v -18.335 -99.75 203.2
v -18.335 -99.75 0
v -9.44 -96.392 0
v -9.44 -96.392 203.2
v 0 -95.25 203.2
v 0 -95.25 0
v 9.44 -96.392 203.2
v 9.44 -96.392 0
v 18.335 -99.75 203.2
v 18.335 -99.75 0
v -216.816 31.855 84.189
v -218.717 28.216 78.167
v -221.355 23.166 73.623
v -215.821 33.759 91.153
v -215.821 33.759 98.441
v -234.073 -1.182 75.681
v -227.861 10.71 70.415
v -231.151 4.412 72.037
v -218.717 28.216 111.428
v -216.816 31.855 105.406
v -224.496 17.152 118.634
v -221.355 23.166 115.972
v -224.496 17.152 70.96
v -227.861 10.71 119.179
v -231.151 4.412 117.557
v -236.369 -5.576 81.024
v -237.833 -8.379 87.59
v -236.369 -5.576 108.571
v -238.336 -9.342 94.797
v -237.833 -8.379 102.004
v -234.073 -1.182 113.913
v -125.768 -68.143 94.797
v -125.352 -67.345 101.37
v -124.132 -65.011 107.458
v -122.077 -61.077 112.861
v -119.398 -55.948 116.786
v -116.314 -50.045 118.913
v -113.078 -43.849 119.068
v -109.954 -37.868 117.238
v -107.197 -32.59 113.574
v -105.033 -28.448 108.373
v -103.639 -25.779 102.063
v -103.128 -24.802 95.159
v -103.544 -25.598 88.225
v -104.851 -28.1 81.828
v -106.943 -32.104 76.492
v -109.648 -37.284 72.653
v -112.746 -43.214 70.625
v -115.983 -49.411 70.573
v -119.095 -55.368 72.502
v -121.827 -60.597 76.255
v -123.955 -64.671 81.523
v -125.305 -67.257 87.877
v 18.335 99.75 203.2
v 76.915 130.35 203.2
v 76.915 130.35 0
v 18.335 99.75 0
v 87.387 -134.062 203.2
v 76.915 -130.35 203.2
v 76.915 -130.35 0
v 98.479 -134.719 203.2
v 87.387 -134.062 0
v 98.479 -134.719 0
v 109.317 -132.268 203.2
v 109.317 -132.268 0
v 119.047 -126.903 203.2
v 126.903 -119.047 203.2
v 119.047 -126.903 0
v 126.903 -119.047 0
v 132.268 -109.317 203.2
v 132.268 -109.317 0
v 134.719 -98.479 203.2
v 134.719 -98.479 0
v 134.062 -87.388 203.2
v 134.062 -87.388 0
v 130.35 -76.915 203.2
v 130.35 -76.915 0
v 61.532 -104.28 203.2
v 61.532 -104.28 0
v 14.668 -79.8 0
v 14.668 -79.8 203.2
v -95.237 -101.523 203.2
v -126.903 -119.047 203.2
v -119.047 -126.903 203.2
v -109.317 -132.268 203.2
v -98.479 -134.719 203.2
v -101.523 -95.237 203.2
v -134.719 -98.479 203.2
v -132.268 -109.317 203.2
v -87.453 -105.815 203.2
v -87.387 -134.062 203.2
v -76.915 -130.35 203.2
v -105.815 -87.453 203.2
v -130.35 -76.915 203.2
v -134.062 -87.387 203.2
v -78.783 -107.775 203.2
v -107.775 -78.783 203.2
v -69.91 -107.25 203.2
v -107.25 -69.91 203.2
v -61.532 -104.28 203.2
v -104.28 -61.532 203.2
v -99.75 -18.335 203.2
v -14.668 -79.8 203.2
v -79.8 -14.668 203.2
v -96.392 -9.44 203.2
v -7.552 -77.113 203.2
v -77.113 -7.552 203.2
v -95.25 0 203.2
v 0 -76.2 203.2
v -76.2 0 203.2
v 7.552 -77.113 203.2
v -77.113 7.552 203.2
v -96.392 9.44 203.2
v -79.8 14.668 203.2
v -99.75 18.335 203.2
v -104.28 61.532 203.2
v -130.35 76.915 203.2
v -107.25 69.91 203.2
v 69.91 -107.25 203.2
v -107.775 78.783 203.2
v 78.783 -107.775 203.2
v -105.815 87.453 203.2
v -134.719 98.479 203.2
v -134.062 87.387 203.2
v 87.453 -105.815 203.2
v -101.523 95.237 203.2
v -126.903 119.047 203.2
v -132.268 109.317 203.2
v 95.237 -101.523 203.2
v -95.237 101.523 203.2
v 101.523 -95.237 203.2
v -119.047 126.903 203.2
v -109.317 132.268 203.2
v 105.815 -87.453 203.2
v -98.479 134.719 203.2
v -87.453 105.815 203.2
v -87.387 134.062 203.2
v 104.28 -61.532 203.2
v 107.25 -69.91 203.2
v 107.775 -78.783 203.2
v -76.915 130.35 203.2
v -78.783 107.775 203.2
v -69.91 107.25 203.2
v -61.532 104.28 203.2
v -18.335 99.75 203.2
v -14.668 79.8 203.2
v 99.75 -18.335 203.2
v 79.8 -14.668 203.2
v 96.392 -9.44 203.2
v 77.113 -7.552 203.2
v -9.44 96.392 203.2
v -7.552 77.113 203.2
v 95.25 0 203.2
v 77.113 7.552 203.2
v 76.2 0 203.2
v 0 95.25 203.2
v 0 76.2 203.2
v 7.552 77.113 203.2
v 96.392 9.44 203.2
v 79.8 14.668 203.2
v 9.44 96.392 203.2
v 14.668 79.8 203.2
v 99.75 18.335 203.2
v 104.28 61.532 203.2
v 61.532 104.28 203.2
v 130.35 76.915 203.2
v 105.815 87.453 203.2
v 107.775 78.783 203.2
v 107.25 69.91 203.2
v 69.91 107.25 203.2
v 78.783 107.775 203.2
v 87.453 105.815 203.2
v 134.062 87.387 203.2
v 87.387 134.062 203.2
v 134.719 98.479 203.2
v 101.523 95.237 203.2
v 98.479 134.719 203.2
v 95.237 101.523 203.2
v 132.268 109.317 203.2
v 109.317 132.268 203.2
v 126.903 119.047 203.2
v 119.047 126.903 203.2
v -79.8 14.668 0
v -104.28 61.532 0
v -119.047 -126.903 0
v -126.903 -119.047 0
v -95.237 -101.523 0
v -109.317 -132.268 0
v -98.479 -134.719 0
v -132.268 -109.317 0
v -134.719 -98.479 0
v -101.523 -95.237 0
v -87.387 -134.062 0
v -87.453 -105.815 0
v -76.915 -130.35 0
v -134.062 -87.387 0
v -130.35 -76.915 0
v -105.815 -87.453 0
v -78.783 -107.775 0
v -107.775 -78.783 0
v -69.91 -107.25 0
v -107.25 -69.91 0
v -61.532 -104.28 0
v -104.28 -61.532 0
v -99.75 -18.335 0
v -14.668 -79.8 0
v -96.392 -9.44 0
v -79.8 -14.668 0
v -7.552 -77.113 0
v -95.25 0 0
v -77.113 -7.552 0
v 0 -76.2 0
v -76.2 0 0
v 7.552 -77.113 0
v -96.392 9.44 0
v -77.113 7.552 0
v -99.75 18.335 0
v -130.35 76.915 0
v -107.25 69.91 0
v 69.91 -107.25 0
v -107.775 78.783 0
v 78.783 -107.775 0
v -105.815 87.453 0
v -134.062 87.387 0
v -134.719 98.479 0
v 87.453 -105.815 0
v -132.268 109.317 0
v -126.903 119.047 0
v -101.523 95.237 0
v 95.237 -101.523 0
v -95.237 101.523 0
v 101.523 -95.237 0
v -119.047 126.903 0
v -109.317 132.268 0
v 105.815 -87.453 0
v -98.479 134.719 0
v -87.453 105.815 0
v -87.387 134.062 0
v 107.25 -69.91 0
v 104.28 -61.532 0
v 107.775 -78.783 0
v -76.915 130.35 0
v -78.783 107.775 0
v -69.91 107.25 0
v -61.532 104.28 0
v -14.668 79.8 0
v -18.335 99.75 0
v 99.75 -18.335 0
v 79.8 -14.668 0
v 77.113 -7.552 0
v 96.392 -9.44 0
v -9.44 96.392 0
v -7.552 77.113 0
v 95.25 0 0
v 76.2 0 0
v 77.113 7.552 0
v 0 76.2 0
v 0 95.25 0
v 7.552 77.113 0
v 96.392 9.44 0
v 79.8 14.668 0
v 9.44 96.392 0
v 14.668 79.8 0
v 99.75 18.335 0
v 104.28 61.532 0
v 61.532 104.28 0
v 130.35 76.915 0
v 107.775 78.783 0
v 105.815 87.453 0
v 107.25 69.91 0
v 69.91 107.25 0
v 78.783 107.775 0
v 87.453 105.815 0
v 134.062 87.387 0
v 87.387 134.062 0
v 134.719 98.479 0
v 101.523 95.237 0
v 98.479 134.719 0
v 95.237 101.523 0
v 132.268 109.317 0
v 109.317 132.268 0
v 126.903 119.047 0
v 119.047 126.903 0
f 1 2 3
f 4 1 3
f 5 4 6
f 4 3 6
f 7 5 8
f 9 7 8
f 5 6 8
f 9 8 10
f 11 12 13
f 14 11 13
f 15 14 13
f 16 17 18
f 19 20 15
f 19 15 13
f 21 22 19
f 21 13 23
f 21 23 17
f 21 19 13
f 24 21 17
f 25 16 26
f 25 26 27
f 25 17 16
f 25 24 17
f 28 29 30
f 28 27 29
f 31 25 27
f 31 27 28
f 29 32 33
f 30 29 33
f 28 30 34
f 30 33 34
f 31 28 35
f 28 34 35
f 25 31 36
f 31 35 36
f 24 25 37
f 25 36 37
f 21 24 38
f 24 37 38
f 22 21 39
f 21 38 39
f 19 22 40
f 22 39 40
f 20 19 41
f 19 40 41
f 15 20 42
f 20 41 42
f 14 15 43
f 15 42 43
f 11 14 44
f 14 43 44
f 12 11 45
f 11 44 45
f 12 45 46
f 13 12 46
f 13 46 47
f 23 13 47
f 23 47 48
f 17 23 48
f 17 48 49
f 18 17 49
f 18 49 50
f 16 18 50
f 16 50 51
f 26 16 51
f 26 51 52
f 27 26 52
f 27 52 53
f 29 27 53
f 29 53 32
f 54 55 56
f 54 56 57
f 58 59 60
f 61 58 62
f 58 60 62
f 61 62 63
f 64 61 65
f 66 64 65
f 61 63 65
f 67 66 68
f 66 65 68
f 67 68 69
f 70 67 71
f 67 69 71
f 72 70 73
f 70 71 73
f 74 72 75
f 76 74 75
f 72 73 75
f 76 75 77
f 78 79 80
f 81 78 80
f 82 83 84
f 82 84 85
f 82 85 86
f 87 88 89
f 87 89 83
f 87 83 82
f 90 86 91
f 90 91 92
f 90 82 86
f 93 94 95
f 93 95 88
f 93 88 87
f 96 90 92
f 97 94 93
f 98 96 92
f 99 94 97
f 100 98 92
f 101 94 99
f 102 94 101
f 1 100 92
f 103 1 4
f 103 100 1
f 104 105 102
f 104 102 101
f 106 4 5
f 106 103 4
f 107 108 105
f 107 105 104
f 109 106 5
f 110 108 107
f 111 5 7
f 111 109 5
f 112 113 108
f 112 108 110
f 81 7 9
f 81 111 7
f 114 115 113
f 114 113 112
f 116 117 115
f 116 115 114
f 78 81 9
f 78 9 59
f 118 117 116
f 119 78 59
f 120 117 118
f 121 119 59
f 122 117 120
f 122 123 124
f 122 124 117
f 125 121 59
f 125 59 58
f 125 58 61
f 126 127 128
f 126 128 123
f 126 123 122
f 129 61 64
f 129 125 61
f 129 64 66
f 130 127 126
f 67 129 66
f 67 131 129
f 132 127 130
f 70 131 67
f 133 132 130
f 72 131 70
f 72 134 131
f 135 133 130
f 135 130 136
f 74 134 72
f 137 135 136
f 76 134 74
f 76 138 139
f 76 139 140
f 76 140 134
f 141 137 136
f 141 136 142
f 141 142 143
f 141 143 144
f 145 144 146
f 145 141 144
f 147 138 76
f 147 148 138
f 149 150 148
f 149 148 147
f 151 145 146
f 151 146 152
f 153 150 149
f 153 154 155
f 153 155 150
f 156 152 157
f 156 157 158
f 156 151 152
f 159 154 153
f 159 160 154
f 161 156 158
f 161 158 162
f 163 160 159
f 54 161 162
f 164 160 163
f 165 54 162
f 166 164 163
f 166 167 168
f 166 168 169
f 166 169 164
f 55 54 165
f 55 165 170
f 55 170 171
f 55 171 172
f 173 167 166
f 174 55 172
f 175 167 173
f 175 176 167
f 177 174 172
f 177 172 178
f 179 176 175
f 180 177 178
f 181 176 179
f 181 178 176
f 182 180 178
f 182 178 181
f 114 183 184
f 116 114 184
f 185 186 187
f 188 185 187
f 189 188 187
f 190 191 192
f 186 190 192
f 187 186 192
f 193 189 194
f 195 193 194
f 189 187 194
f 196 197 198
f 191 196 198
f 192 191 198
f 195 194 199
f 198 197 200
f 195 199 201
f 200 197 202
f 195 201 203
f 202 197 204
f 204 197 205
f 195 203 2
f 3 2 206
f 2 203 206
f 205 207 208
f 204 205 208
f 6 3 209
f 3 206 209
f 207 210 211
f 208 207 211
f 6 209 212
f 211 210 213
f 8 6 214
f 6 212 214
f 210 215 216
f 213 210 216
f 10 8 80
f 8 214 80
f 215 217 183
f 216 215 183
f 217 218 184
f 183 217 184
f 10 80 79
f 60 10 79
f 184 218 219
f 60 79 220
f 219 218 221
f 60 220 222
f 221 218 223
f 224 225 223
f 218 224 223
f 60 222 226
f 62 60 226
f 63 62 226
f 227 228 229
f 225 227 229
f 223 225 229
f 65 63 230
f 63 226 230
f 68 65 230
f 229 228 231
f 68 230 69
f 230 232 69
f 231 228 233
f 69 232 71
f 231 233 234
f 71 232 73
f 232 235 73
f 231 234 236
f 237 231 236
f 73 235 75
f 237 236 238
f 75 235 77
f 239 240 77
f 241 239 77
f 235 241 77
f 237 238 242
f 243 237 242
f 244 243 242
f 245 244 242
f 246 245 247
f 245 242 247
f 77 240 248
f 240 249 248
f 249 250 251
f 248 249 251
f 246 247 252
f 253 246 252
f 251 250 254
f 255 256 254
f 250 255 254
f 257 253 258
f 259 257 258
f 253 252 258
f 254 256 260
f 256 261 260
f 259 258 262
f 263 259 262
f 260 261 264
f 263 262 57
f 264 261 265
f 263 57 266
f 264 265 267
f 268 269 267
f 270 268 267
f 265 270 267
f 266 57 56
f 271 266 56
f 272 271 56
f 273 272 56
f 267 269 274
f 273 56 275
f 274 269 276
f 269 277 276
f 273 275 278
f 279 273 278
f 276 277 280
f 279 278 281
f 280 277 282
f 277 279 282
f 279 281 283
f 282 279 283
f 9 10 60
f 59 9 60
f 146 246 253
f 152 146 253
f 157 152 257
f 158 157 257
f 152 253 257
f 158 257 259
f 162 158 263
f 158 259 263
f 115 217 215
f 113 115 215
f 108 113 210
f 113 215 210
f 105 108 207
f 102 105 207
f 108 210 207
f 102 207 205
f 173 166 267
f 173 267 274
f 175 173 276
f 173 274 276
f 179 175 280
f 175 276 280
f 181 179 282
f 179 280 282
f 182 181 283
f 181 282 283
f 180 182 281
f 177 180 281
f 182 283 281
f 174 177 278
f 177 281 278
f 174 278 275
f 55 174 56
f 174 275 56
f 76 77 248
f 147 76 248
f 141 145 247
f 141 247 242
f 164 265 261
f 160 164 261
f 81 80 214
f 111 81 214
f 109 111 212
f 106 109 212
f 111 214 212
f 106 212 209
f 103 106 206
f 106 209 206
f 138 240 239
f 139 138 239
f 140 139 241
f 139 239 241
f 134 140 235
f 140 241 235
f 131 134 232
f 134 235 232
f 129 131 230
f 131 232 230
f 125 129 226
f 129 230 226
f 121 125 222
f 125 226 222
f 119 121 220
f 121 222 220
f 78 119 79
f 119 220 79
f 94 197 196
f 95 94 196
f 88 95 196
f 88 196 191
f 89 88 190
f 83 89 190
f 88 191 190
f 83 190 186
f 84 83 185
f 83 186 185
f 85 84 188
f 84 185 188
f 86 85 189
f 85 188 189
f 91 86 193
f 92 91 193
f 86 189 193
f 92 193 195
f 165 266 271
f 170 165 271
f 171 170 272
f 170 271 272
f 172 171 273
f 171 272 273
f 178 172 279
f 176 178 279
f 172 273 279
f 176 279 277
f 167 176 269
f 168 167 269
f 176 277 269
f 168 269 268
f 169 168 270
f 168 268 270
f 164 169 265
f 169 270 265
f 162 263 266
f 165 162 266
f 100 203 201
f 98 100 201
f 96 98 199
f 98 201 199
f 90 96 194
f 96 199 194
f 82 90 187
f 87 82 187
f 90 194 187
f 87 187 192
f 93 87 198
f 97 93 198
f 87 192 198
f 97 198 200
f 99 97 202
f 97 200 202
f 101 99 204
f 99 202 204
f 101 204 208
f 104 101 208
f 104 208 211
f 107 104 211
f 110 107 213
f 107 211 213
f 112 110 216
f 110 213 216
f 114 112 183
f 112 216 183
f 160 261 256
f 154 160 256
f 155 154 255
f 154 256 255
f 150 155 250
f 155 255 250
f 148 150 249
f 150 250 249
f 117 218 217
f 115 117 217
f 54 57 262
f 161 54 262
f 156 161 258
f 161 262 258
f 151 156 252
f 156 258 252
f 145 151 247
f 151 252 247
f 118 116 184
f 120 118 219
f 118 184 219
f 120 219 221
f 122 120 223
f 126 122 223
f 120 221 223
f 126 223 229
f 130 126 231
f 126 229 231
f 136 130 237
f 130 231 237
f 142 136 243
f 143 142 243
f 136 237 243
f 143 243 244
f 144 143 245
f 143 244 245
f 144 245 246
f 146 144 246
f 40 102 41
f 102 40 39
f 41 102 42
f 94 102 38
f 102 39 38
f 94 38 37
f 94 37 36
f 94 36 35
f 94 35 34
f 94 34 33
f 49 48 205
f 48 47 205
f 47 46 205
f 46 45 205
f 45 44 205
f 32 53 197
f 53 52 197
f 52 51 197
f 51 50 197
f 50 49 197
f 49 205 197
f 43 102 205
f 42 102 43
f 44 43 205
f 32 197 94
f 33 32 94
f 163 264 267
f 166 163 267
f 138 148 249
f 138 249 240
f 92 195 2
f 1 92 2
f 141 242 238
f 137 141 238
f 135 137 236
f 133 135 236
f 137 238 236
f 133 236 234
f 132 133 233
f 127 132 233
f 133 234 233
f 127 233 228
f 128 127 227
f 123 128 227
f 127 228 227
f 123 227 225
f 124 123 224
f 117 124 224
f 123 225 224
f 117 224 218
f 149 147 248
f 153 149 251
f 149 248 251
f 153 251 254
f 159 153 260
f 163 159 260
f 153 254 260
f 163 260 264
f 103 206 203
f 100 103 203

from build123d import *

# Parameters (mm, degrees)
F1_DEPTH = 203.2
F2_R     = 24.4501828069
F3_DEPTH = 127


# Not quite as in the source:
# - ends of sketch curves that miss each other by under 0.0002 mm in the source are joined
# - the program builds the solid bodies; features that only make, move or delete a surface that nothing else refers to are left out


with BuildPart() as f1:
    # F0 (on Top) → F1 (new body)
    with BuildSketch(Plane.XY):
        with BuildLine():
            Line((-18.3351678, 99.7503212), (-76.9148068, 130.3502854))
            ThreePointArc((-76.9148068, 130.3502854), (-123.2518754265, 123.2518754265), (-130.3502933453, 76.9148026497))
            Line((-130.3502933453, 76.9148026497), (-99.7503212, 18.3351678))
            ThreePointArc((-99.7503212, 18.3351678), (-95.25, -1.12567e-05), (-99.7503332097, -18.3351869265))
            Line((-99.7503332097, -18.3351869265), (-130.3502854, -76.9148322))
            ThreePointArc((-130.3502854, -76.9148322), (-123.2518716246, -123.2518792283), (-76.9148130735, -130.3502987903))
            Line((-76.9148130735, -130.3502987903), (-18.3351678, -99.7503466))
            ThreePointArc((-18.3351678, -99.7503466), (1.12567e-05, -95.2500254), (18.3351869265, -99.7503586097))
            Line((18.3351869265, -99.7503586097), (76.9148322, -130.3503108))
            ThreePointArc((76.9148322, -130.3503108), (123.2518754265, -123.2518754265), (130.3503092141, -76.9148330284))
            Line((130.3503092141, -76.9148330284), (99.7503466, -18.3351932))
            ThreePointArc((99.7503466, -18.3351932), (95.25, -1.12567e-05), (99.7503282309, 18.3351773954))
            Line((99.7503282309, 18.3351773954), (130.3503108, 76.9148068))
            ThreePointArc((130.3503108, 76.9148068), (123.2518792283, 123.2518716246), (76.9148226046, 130.3503037691))
            Line((76.9148226046, 130.3503037691), (18.3351932, 99.7503212))
            ThreePointArc((18.3351932, 99.7503212), (1.12567e-05, 95.25), (-18.3351678, 99.7503212))
        make_face()
        with BuildLine():
            ThreePointArc((-104.2802295109, 61.5318322315), (-98.6015083009, 98.6014923815), (-61.5318521865, 104.2802399347))
            Line((-61.5318521865, 104.2802399347), (-14.6681444, 79.8002468))
            ThreePointArc((-14.6681444, 79.8002468), (0, 76.2), (14.6681373897, 79.8002602202))
            Line((14.6681373897, 79.8002602202), (61.5318556, 104.2802334))
            ThreePointArc((61.5318556, 104.2802334), (98.601504143, 98.6014965393), (104.280234956, 61.5318426553))
            Line((104.280234956, 61.5318426553), (79.8002722, 14.6681444))
            ThreePointArc((79.8002722, 14.6681444), (76.2, -1.12567e-05), (79.8002760891, -14.6681677685))
            Line((79.8002760891, -14.6681677685), (104.2802588, -61.5318556))
            ThreePointArc((104.2802588, -61.5318556), (98.6015003412, -98.6015003412), (61.5318626103, -104.2802453798))
            Line((61.5318626103, -104.2802453798), (14.6681444, -79.8002722))
            ThreePointArc((14.6681444, -79.8002722), (0, -76.2000254), (-14.6681373897, -79.8002856202))
            Line((-14.6681373897, -79.8002856202), (-61.5318556, -104.2802588))
            ThreePointArc((-61.5318556, -104.2802588), (-98.6015044991, -98.6014961833), (-104.2802399347, -61.5318521865))
            Line((-104.2802399347, -61.5318521865), (-79.8002468, -14.6681698))
            ThreePointArc((-79.8002468, -14.6681698), (-76.2, -1.12567e-05), (-79.8002602202, 14.6681373897))
            Line((-79.8002602202, 14.6681373897), (-104.2802295109, 61.5318322315))
        make_face(mode=Mode.SUBTRACT)
    extrude(amount=F1_DEPTH)

    # F2 (on face) → F3 (join)
    with BuildSketch(Plane(origin=(-70.8422549592, 37.0055279036, 0), x_dir=(-0.4630021293, -0.8863571674, 0), z_dir=(-0.8863571674, 0.4630021293, 0))):
        with Locations((94.1798388958, 94.7972759604)):
            Circle(F2_R)
    extrude(amount=F3_DEPTH)


solid = f1.part
